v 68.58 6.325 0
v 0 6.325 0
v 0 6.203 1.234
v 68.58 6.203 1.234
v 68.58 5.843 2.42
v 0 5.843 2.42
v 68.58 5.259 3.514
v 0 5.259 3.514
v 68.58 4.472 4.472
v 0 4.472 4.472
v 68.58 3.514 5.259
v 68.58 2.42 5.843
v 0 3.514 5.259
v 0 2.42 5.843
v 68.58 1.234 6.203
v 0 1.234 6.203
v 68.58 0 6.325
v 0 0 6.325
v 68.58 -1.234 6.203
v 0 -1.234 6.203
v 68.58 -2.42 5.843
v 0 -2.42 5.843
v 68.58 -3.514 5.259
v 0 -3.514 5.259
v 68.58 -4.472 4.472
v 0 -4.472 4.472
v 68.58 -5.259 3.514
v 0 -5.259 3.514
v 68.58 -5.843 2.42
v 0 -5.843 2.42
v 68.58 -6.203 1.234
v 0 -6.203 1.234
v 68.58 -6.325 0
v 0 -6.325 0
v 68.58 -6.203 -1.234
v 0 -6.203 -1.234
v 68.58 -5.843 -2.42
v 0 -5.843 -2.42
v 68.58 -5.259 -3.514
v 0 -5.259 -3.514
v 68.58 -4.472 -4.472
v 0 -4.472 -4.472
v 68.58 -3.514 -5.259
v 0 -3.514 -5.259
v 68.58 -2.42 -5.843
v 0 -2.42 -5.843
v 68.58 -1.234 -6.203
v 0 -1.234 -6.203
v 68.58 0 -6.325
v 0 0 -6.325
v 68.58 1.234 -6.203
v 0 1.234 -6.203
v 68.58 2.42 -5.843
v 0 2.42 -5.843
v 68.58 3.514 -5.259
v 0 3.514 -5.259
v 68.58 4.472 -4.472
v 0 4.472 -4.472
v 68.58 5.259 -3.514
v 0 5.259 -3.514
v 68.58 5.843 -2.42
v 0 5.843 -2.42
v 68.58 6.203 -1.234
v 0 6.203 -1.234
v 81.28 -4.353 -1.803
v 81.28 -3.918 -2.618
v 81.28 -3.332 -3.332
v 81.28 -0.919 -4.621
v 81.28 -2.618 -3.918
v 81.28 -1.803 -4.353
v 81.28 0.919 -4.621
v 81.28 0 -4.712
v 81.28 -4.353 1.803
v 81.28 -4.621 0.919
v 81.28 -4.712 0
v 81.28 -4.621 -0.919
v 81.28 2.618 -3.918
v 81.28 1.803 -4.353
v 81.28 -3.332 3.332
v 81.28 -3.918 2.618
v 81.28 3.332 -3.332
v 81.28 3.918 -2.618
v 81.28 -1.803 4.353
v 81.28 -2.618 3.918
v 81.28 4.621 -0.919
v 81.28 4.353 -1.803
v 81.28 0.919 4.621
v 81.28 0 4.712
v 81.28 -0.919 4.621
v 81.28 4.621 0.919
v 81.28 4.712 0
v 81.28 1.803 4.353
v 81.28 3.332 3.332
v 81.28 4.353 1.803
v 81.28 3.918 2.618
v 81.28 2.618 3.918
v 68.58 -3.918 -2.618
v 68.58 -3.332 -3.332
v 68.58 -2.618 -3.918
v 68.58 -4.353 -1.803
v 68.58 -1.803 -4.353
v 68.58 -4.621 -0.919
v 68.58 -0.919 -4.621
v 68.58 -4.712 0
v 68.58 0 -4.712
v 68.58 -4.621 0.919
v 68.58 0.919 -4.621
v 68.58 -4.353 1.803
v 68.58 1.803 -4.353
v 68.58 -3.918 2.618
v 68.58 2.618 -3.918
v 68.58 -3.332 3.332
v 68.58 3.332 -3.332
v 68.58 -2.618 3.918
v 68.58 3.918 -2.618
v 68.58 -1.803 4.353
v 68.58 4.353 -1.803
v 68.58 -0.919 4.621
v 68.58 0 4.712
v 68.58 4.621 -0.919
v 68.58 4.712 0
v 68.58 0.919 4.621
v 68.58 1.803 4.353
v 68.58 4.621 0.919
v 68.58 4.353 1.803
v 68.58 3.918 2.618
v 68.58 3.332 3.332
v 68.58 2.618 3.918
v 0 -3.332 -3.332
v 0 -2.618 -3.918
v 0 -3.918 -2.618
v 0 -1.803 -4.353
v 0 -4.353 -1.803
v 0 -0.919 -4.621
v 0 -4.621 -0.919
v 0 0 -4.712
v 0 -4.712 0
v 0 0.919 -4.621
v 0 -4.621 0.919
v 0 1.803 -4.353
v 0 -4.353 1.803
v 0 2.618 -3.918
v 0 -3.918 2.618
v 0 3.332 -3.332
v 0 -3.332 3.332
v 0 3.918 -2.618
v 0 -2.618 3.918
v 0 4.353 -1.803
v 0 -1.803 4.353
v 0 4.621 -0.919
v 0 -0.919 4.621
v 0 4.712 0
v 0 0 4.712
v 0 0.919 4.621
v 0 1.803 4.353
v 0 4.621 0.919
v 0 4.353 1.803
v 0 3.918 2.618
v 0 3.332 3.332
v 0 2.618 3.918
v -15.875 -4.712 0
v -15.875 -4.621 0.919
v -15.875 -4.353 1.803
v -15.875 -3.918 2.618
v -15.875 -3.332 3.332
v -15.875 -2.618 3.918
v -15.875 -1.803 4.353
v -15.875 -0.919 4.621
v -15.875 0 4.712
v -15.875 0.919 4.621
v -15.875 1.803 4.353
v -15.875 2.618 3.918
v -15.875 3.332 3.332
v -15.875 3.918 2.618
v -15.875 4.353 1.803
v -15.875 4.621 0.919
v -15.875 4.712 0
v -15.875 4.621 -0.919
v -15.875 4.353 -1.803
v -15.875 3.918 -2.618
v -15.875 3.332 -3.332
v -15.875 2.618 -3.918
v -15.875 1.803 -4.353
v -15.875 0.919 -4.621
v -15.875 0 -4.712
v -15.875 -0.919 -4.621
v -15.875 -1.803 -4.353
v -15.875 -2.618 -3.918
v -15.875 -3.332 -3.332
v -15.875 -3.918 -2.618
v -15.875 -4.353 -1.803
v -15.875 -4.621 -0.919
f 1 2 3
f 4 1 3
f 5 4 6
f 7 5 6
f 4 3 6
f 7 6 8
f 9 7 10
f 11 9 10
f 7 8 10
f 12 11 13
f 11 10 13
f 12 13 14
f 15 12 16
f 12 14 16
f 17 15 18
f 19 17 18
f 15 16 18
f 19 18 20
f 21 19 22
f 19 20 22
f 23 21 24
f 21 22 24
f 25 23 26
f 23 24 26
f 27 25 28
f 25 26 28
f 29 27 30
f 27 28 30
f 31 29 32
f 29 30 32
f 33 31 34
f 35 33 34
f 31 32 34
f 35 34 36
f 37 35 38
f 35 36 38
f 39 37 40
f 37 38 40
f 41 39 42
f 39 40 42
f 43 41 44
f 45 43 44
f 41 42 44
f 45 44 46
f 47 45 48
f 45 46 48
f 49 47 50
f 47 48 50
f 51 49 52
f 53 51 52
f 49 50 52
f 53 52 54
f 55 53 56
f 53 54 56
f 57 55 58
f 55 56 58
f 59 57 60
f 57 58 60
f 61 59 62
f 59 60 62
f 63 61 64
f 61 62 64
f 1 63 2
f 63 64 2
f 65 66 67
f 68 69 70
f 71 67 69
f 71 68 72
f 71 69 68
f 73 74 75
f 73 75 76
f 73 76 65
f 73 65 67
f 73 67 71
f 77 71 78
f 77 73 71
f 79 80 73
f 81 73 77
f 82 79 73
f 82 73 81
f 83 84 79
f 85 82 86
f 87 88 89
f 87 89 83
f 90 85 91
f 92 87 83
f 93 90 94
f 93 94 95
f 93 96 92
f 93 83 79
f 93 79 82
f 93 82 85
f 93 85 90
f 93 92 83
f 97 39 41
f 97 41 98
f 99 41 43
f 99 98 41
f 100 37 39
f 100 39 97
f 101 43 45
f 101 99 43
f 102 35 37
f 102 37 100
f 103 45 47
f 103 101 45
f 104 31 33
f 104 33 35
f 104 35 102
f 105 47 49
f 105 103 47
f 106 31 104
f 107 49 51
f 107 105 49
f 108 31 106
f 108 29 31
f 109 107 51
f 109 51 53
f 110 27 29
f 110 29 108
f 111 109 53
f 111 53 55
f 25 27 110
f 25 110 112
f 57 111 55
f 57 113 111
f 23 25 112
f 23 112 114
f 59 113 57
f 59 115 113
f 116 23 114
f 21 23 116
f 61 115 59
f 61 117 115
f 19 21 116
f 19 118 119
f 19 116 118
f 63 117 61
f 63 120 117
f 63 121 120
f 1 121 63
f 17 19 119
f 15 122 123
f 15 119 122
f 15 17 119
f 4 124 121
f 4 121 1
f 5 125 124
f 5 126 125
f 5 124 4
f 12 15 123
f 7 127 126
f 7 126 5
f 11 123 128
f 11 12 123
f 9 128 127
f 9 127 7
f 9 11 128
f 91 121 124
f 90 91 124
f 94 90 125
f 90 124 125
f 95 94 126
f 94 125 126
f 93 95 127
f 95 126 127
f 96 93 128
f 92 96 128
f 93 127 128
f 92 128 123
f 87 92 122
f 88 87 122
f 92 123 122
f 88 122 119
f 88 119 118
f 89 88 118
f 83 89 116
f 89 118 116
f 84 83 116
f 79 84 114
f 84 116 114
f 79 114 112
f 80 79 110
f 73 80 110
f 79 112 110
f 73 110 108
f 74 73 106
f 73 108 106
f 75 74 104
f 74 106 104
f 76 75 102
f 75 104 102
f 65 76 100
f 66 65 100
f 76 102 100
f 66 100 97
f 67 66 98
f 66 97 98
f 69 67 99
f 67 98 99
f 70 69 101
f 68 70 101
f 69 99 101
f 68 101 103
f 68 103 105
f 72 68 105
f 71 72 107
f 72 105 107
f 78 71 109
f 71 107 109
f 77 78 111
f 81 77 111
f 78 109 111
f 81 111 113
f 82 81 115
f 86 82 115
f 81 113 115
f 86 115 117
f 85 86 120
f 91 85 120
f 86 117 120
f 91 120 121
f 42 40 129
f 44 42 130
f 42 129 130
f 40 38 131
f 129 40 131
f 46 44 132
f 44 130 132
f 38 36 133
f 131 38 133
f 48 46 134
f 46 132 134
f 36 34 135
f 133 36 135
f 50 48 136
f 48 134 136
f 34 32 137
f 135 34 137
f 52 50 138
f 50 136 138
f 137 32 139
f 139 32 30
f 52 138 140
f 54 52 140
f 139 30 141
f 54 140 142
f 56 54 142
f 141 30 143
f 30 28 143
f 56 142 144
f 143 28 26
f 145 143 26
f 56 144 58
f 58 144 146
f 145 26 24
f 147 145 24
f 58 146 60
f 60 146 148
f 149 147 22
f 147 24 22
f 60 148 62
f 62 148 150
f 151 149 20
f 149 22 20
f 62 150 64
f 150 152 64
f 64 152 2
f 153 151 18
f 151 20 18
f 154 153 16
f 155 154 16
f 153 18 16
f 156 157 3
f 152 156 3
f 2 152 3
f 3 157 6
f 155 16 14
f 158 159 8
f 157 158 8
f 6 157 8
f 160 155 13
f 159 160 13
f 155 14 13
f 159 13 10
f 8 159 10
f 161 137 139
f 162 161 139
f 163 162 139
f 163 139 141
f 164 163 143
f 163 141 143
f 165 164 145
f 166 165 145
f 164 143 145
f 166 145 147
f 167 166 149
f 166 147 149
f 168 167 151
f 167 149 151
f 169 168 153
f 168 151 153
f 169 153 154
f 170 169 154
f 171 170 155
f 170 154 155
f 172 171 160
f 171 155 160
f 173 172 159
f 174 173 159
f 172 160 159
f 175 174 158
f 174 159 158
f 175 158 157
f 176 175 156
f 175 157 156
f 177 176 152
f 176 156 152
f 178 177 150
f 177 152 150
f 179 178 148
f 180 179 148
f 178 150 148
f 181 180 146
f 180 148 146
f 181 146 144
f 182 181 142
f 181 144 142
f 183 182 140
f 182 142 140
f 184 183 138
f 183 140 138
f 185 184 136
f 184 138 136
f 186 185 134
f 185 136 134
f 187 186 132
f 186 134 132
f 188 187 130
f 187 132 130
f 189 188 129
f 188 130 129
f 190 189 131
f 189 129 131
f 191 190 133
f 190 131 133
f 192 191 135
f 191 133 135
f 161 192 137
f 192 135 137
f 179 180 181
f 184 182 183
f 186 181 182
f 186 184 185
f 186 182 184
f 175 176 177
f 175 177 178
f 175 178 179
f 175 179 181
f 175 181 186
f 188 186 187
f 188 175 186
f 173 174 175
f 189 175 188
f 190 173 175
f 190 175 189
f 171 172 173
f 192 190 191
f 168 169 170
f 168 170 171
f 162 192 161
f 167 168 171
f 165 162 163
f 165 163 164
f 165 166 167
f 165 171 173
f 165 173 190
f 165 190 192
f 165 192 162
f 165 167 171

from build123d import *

# Parameters (mm, degrees)
F0_R     = 6.3246
F1_DEPTH = 68.58
F2_R     = 4.7117
F3_DEPTH = 12.7
F4_R     = 4.7117
F5_DEPTH = 15.875


with BuildPart() as f1:
    # F0 (on Right) → F1 (new body)
    with BuildSketch(Plane.YZ):
        Circle(F0_R)
    extrude(amount=F1_DEPTH)

    # F2 (on face) → F3 (join)
    with BuildSketch(Plane.YZ.offset(68.58)):
        Circle(F2_R)
    extrude(amount=F3_DEPTH)

    # F4 (on face) → F5 (join)
    with BuildSketch(Plane(origin=(0, 0, 0), x_dir=(0, -1, 0), z_dir=(-1, 0, 0))):
        Circle(F4_R)
    extrude(amount=F5_DEPTH)


solid = f1.part
